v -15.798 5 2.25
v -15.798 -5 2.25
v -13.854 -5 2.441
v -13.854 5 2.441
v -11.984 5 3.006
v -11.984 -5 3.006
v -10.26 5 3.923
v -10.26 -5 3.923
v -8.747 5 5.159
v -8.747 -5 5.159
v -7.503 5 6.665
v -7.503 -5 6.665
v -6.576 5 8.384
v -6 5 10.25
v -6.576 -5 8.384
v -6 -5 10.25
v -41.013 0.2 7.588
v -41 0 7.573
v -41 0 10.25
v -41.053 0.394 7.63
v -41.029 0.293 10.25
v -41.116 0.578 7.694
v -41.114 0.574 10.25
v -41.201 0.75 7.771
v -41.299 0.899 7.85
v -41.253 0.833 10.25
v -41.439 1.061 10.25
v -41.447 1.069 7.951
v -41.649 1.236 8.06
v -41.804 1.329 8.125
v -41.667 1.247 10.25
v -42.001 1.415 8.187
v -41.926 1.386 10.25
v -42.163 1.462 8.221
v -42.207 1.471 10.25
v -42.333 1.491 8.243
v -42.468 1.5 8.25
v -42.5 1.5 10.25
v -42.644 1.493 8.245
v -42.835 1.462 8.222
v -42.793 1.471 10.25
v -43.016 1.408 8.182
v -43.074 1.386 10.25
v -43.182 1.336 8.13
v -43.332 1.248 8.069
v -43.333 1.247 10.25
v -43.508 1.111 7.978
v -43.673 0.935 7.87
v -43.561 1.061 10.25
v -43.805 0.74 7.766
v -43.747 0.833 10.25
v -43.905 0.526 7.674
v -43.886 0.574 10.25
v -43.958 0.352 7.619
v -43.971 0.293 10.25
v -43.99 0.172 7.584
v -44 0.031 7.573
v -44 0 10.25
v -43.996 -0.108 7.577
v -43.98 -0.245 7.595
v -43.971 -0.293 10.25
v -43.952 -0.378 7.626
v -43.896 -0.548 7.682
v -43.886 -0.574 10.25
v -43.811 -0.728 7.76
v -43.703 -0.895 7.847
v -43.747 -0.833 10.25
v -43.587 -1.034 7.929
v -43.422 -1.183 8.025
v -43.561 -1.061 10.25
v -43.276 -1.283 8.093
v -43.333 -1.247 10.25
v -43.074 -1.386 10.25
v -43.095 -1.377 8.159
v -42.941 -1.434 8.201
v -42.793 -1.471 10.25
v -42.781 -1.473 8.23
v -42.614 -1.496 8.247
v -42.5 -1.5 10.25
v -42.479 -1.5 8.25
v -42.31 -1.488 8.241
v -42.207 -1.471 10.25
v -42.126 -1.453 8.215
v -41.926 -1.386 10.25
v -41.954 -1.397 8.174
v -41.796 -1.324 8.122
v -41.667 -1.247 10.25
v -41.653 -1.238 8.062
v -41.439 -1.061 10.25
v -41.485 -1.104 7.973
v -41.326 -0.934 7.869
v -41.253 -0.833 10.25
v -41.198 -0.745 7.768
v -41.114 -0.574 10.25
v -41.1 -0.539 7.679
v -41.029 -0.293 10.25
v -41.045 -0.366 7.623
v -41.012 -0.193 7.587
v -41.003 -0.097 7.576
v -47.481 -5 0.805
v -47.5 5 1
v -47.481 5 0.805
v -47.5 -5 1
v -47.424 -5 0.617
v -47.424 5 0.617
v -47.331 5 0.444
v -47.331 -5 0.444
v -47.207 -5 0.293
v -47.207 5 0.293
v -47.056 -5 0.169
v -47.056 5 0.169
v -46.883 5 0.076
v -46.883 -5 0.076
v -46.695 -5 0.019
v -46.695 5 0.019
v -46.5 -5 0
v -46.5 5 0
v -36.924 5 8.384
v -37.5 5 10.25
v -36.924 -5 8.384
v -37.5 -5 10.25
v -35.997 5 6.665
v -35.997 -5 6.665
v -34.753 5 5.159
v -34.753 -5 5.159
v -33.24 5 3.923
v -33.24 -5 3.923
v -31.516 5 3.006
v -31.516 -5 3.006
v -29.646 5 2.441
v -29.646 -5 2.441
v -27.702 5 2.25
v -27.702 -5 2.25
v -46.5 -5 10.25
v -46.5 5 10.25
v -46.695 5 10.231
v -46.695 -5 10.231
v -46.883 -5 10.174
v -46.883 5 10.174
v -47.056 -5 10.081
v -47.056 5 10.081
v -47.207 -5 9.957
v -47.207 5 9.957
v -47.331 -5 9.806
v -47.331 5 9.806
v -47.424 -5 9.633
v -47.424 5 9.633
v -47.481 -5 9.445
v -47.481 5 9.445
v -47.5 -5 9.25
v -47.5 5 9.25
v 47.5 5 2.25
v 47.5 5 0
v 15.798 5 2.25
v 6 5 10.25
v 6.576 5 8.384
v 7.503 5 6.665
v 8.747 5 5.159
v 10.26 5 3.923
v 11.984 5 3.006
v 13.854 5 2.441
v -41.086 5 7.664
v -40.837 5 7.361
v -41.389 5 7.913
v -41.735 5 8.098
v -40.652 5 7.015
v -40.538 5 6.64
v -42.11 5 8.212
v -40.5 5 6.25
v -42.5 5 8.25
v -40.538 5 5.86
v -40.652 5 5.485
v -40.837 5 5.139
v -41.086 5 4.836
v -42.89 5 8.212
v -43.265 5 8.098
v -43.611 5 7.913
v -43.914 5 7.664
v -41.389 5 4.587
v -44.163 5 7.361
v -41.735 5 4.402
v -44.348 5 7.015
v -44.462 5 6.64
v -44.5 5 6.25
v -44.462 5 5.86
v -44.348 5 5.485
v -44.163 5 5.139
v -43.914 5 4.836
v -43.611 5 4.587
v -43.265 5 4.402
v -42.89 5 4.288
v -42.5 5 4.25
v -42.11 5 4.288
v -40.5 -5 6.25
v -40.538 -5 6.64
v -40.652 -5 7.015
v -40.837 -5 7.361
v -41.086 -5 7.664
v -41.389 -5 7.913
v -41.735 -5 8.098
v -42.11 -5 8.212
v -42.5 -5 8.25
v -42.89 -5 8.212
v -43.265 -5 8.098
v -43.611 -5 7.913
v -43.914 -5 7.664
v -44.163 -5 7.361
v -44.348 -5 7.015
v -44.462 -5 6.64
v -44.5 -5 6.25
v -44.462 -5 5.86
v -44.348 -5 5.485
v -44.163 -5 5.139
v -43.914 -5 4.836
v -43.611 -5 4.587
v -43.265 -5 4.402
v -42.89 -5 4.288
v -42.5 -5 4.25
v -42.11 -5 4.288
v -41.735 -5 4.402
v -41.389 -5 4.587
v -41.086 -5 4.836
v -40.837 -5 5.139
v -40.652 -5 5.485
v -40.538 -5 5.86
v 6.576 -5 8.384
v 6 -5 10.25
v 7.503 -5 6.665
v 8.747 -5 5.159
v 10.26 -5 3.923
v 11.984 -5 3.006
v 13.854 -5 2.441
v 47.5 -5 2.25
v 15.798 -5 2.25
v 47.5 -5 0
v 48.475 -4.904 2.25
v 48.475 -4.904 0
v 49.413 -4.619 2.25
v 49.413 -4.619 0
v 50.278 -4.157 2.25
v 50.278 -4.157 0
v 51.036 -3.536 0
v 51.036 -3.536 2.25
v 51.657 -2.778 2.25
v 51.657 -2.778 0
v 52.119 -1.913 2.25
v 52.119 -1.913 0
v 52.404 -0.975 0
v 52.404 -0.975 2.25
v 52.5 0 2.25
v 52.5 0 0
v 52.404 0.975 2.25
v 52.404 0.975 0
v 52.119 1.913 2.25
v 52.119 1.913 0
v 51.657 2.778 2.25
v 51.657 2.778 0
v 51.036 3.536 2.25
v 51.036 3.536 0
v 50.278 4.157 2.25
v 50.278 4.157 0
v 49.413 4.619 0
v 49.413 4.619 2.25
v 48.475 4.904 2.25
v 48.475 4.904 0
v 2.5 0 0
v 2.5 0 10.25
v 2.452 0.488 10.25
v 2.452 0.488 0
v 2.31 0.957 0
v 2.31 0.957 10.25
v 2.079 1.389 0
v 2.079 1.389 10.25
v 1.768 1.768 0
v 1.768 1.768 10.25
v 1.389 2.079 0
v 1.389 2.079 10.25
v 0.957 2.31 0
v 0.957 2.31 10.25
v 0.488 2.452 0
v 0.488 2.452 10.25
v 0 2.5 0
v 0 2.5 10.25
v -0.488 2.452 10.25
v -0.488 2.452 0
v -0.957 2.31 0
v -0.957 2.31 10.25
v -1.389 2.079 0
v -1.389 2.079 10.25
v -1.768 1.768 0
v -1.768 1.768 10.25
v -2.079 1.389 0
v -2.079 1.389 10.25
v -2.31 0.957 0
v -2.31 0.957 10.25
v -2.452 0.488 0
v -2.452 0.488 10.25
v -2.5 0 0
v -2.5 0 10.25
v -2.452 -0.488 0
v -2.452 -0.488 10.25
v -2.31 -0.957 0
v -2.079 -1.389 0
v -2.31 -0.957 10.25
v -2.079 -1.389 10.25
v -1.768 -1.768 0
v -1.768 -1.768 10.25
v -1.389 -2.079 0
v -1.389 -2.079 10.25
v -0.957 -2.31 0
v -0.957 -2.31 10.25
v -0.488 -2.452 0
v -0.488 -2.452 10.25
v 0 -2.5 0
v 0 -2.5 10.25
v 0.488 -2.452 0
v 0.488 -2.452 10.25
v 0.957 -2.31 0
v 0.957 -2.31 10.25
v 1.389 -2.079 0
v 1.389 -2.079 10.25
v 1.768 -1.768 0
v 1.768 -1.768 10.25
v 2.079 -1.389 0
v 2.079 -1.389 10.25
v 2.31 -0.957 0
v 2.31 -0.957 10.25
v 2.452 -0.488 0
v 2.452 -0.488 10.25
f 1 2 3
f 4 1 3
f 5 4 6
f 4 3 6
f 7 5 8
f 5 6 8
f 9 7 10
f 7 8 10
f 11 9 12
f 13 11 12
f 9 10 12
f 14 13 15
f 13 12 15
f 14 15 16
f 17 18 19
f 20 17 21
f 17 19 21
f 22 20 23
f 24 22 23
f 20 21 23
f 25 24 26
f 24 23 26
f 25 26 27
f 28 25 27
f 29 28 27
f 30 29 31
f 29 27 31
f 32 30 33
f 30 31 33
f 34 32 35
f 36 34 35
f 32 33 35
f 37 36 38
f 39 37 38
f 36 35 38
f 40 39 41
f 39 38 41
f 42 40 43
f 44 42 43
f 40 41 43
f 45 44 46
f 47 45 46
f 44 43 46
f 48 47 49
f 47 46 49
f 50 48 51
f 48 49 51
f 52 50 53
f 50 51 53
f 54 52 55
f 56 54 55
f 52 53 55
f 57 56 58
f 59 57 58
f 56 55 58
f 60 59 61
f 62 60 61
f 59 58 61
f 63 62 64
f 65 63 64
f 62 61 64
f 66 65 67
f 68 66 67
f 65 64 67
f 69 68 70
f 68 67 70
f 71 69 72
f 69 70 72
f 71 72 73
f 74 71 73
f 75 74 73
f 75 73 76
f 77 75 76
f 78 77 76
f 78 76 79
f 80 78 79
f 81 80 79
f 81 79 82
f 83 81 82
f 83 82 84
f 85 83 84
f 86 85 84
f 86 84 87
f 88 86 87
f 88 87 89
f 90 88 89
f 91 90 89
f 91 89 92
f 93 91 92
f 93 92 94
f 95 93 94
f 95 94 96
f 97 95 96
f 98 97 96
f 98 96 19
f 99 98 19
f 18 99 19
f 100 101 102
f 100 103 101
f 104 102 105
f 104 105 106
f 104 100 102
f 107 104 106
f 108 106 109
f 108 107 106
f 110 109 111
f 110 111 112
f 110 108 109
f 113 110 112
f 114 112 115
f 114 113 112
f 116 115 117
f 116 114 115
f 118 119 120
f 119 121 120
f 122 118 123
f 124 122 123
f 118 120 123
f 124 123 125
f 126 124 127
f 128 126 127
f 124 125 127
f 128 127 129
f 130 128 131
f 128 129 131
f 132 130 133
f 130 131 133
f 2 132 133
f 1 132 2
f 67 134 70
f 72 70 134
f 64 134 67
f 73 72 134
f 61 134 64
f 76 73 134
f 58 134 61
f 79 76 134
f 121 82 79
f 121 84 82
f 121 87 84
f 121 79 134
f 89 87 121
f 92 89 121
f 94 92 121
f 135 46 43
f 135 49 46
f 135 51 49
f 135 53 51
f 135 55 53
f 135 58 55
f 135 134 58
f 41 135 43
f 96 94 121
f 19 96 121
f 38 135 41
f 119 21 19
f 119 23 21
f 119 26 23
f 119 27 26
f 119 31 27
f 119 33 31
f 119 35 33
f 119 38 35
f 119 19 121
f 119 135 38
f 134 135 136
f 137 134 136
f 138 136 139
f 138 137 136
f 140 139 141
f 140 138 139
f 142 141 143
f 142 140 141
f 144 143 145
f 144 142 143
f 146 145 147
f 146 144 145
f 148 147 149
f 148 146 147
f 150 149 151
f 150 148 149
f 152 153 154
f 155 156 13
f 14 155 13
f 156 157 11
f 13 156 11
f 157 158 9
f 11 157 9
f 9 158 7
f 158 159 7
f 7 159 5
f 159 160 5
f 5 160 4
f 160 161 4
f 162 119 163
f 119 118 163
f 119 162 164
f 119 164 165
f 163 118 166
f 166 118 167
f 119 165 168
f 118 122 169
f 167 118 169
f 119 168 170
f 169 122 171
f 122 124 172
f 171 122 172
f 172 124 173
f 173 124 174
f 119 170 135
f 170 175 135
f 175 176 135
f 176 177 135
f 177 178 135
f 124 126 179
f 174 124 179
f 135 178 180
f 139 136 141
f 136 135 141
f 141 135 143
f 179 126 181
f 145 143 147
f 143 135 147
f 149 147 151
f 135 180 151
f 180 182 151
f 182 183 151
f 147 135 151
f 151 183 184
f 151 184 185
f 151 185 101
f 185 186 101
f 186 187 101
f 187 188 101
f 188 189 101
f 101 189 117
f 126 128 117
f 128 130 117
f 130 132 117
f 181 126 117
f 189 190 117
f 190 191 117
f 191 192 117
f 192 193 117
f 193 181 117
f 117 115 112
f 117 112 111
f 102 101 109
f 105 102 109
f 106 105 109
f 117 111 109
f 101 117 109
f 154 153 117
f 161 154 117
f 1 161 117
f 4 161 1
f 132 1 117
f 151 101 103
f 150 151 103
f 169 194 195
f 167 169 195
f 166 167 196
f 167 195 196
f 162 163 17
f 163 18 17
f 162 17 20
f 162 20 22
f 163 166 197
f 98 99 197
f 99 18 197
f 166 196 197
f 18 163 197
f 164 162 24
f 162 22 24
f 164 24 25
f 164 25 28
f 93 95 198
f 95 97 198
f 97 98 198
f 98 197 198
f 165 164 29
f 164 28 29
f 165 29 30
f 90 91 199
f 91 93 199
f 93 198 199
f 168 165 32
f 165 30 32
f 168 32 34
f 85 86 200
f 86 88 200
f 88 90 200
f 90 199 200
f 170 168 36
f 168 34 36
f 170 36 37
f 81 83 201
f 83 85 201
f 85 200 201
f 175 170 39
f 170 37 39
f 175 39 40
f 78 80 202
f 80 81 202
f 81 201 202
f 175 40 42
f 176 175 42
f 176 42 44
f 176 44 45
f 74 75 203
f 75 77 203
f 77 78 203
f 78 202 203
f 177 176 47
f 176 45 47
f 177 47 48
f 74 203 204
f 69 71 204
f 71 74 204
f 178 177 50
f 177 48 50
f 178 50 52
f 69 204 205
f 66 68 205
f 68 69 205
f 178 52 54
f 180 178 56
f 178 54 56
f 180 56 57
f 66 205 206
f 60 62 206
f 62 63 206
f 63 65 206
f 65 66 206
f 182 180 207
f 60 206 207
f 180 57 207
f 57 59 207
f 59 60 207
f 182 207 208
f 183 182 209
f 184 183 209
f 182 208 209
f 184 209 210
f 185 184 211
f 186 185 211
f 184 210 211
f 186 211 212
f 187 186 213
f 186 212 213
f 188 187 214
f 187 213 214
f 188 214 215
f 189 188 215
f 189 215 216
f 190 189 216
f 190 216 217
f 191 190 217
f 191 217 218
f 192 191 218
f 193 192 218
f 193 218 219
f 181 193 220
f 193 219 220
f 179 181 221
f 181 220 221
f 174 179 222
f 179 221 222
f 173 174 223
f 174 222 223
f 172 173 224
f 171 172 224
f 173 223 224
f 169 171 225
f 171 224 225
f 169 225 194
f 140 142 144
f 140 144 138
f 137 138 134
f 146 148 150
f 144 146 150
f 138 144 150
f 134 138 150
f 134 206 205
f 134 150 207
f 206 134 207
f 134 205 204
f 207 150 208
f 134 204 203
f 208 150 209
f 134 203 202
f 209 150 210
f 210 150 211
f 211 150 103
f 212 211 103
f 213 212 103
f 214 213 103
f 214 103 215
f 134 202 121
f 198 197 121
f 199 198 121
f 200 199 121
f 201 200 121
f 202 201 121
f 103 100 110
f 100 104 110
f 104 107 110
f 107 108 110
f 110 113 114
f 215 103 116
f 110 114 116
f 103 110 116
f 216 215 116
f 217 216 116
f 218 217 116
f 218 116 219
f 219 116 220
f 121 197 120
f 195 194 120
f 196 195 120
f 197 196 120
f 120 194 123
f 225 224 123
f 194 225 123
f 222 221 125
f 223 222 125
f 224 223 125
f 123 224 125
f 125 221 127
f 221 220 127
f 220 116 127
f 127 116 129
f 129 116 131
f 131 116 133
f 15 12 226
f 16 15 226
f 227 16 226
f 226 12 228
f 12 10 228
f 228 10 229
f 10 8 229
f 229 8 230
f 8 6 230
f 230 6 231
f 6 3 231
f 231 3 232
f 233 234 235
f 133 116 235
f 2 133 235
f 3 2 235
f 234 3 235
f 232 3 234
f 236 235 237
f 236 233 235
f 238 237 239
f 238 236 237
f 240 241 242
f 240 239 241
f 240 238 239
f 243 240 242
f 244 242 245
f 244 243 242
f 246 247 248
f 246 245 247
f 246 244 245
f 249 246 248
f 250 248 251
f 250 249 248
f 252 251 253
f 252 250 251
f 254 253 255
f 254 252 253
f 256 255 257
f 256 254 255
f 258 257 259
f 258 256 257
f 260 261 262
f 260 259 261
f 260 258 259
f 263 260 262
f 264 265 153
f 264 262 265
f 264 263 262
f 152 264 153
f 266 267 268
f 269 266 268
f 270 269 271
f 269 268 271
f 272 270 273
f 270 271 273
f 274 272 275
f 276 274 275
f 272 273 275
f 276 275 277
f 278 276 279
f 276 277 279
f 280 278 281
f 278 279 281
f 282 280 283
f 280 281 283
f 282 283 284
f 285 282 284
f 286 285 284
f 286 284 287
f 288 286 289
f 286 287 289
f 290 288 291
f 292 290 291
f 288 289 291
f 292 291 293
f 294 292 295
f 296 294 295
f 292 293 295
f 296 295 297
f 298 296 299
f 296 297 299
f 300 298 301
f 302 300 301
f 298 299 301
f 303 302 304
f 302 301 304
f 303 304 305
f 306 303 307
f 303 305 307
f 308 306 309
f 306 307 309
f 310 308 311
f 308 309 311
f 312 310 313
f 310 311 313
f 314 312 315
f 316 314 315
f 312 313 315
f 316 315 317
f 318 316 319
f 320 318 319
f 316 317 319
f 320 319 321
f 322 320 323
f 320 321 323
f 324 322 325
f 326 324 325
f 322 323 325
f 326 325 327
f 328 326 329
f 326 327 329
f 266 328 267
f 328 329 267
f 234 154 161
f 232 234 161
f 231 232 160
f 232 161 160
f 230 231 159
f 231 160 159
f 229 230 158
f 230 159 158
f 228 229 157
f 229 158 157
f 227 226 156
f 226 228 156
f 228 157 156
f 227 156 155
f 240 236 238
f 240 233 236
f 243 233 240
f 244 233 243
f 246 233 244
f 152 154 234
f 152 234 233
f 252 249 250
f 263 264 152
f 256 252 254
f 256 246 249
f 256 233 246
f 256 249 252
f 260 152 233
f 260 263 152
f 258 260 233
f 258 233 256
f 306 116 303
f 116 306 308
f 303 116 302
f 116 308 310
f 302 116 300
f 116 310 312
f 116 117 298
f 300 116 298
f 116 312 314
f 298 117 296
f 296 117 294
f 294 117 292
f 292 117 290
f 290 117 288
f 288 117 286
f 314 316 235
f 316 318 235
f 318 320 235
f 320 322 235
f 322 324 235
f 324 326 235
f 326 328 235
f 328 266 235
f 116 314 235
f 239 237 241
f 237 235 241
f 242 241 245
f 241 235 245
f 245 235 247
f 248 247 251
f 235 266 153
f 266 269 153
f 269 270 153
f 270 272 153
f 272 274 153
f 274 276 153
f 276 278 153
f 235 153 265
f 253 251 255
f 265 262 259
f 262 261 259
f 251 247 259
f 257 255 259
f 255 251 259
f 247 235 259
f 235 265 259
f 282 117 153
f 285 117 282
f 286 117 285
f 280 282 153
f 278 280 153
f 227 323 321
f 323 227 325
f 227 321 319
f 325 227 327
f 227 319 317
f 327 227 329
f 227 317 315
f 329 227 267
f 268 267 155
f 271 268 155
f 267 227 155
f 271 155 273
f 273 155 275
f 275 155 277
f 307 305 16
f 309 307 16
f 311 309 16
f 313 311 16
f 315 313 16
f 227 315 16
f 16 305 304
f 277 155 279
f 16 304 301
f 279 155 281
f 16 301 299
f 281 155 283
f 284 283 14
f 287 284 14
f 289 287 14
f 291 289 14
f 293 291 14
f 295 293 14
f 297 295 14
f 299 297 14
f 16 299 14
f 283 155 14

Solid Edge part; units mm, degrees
sketch "Sketch1" plane through (0, 0, 0) normal (0, 0, 1) x (1, 0, 0)
  line L0 (-47.5, 5) -> (-47.5, -5)
  line L1 (-47.5, -5) -> (47.5, -5)
  line L2 (47.5, -5) -> (47.5, 5)
  line L3 (47.5, 5) -> (-47.5, 5)
  dimension "D1" = 10
  dimension "D2" = 95
extrude "Ajout_matière_1" add sketch "Sketch1" along normal blind 2.25
sketch "Sketch2" plane through (0, 0, 2.25) normal (0, 0, 1) x (1, 0, 0)
  line L0 (-47.5, 5) -> (-47.5, -5)
  line L1 (-47.5, -5) -> (-37.5, -5)
  line L2 (-37.5, -5) -> (-37.5, 5)
  line L3 (-37.5, 5) -> (-47.5, 5)
  dimension "D1" = 10
extrude "Ajout_matière_2" add sketch "Sketch2" along normal blind 8
sketch "Sketch3" plane through (-42.5, 0, 10.25) normal (0, 0, 1) x (1, 0, 0)
  circle A0 centre (0, 0) radius 1.5
  dimension "D1" = 3
extrude "Enlèvement_matière_1" cut sketch "Sketch3" against normal blind 5
sketch "Sketch4" plane through (0, -5, 6) normal (0, -1, 0) x (1, 0, 0)
  circle A0 centre (-42.5, 0.25) radius 2
  dimension "D1" = 4
extrude "Enlèvement_matière_2" cut sketch "Sketch4" against normal blind 10
sketch "Sketch5" plane through (7.5, 0, 2.25) normal (0, 0, 1) x (1, 0, 0)
  line L0 (-13.5, 5) -> (-1.5, 5)
  line L1 (-1.5, 5) -> (-1.5, -5)
  line L2 (-1.5, -5) -> (-13.5, -5)
  line L3 (-13.5, -5) -> (-13.5, 5)
  dimension "D1" = 12
extrude "Ajout_matière_3" add sketch "Sketch5" along normal blind 8
sketch "Sketch6" plane through (0, 0, 10.25) normal (0, 0, 1) x (1, 0, 0)
  circle A0 centre (0, 0) radius 2.5
extrude "Enlèvement_matière_3" cut sketch "Sketch6" against normal blind 11
fillet "Congé_2" radius 1 2 edges at (-47.5, 0, 0) (-47.5, 0, 10.25)
sketch "Sketch7" plane through (33.649, 0, 2.25) normal (0, 0, 1) x (1, 0, 0)
  line L0 (13.851, 5) -> (13.851, -5)
  arc A0 (13.851, 5) -> (13.851, -5) centre (13.851, 0) cw
extrude "Ajout_matière_4" add sketch "Sketch7" against normal blind 2.25
fillet "Congé_3" radius 10 3 edges at (-37.5, 0, 2.25) (-6, 0, 2.25) (6, 0, 2.25)
properties material "Plastique ABS, haute performance"
